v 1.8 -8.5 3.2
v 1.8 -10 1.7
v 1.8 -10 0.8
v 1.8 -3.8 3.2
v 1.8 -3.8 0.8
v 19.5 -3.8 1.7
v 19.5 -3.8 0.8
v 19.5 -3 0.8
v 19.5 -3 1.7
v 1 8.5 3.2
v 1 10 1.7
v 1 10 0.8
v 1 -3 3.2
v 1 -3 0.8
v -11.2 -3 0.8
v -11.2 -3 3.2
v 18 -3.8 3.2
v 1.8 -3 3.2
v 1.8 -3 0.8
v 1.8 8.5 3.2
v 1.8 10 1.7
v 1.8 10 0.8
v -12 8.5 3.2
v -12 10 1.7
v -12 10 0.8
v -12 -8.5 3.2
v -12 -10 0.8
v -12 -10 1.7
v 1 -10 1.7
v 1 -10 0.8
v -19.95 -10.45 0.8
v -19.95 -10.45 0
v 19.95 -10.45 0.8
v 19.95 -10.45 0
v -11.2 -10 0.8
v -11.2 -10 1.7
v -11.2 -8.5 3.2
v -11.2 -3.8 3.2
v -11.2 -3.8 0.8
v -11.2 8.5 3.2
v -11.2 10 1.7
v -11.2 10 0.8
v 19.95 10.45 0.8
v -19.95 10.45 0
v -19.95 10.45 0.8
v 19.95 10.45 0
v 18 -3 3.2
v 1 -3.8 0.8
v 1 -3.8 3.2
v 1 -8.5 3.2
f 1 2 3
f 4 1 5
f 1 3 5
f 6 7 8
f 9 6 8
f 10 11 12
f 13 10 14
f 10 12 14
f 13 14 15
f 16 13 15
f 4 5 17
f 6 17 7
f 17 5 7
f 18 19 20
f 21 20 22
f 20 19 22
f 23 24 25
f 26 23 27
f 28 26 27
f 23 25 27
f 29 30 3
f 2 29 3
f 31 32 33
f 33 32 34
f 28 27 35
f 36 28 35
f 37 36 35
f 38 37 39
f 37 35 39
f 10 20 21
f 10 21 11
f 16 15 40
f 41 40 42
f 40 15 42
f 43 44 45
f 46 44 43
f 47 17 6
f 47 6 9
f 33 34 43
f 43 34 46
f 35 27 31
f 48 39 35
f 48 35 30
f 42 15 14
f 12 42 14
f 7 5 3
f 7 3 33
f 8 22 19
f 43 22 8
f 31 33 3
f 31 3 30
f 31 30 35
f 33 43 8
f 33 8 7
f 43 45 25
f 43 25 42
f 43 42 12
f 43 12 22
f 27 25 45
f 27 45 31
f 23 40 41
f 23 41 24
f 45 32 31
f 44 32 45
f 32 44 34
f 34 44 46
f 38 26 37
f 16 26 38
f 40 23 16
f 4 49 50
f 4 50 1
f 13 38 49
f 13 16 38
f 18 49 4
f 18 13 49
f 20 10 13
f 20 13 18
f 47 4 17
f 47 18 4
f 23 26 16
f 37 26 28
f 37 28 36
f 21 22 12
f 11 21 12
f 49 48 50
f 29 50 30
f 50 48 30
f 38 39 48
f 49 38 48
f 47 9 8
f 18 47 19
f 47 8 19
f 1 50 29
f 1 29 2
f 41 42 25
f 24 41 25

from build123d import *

# Parameters (mm, degrees)
F0_W     = 39.9
F0_H     = 20.9
F1_DEPTH = 0.8
F3_DEPTH = 2.4
F4_SIZE  = 1.5


with BuildPart() as f1:
    # F0 (on Top) → F1 (new body)
    with BuildSketch(Plane.XY):
        Rectangle(F0_W, F0_H)
    extrude(amount=F1_DEPTH)

    # F2 (on face) → F3 (join)
    with BuildSketch(Plane.XY.offset(0.8)):
        Polygon((-12, -10), (-11.2, -10), (-11.2, -3.8), (1, -3.8), (1, -10), (1.8, -10), (1.8, -3.8), (19.5, -3.8), (19.5, -3), (1.8, -3), (1.8, 10), (1, 10), (1, -3), (-11.2, -3), (-11.2, 10), (-12, 10), align=None)
    extrude(amount=F3_DEPTH)

    # F4
    f4_edges = [f1.edges().sort_by_distance(p)[0] for p in [
        (-11.6, -10, 3.2),
        (1.4, -10, 3.2),
        (-11.6, 10, 3.2),
        (1.4, 10, 3.2),
        (19.5, -3.4, 3.2),
    ]]
    chamfer(f4_edges, length=F4_SIZE)


solid = f1.part
